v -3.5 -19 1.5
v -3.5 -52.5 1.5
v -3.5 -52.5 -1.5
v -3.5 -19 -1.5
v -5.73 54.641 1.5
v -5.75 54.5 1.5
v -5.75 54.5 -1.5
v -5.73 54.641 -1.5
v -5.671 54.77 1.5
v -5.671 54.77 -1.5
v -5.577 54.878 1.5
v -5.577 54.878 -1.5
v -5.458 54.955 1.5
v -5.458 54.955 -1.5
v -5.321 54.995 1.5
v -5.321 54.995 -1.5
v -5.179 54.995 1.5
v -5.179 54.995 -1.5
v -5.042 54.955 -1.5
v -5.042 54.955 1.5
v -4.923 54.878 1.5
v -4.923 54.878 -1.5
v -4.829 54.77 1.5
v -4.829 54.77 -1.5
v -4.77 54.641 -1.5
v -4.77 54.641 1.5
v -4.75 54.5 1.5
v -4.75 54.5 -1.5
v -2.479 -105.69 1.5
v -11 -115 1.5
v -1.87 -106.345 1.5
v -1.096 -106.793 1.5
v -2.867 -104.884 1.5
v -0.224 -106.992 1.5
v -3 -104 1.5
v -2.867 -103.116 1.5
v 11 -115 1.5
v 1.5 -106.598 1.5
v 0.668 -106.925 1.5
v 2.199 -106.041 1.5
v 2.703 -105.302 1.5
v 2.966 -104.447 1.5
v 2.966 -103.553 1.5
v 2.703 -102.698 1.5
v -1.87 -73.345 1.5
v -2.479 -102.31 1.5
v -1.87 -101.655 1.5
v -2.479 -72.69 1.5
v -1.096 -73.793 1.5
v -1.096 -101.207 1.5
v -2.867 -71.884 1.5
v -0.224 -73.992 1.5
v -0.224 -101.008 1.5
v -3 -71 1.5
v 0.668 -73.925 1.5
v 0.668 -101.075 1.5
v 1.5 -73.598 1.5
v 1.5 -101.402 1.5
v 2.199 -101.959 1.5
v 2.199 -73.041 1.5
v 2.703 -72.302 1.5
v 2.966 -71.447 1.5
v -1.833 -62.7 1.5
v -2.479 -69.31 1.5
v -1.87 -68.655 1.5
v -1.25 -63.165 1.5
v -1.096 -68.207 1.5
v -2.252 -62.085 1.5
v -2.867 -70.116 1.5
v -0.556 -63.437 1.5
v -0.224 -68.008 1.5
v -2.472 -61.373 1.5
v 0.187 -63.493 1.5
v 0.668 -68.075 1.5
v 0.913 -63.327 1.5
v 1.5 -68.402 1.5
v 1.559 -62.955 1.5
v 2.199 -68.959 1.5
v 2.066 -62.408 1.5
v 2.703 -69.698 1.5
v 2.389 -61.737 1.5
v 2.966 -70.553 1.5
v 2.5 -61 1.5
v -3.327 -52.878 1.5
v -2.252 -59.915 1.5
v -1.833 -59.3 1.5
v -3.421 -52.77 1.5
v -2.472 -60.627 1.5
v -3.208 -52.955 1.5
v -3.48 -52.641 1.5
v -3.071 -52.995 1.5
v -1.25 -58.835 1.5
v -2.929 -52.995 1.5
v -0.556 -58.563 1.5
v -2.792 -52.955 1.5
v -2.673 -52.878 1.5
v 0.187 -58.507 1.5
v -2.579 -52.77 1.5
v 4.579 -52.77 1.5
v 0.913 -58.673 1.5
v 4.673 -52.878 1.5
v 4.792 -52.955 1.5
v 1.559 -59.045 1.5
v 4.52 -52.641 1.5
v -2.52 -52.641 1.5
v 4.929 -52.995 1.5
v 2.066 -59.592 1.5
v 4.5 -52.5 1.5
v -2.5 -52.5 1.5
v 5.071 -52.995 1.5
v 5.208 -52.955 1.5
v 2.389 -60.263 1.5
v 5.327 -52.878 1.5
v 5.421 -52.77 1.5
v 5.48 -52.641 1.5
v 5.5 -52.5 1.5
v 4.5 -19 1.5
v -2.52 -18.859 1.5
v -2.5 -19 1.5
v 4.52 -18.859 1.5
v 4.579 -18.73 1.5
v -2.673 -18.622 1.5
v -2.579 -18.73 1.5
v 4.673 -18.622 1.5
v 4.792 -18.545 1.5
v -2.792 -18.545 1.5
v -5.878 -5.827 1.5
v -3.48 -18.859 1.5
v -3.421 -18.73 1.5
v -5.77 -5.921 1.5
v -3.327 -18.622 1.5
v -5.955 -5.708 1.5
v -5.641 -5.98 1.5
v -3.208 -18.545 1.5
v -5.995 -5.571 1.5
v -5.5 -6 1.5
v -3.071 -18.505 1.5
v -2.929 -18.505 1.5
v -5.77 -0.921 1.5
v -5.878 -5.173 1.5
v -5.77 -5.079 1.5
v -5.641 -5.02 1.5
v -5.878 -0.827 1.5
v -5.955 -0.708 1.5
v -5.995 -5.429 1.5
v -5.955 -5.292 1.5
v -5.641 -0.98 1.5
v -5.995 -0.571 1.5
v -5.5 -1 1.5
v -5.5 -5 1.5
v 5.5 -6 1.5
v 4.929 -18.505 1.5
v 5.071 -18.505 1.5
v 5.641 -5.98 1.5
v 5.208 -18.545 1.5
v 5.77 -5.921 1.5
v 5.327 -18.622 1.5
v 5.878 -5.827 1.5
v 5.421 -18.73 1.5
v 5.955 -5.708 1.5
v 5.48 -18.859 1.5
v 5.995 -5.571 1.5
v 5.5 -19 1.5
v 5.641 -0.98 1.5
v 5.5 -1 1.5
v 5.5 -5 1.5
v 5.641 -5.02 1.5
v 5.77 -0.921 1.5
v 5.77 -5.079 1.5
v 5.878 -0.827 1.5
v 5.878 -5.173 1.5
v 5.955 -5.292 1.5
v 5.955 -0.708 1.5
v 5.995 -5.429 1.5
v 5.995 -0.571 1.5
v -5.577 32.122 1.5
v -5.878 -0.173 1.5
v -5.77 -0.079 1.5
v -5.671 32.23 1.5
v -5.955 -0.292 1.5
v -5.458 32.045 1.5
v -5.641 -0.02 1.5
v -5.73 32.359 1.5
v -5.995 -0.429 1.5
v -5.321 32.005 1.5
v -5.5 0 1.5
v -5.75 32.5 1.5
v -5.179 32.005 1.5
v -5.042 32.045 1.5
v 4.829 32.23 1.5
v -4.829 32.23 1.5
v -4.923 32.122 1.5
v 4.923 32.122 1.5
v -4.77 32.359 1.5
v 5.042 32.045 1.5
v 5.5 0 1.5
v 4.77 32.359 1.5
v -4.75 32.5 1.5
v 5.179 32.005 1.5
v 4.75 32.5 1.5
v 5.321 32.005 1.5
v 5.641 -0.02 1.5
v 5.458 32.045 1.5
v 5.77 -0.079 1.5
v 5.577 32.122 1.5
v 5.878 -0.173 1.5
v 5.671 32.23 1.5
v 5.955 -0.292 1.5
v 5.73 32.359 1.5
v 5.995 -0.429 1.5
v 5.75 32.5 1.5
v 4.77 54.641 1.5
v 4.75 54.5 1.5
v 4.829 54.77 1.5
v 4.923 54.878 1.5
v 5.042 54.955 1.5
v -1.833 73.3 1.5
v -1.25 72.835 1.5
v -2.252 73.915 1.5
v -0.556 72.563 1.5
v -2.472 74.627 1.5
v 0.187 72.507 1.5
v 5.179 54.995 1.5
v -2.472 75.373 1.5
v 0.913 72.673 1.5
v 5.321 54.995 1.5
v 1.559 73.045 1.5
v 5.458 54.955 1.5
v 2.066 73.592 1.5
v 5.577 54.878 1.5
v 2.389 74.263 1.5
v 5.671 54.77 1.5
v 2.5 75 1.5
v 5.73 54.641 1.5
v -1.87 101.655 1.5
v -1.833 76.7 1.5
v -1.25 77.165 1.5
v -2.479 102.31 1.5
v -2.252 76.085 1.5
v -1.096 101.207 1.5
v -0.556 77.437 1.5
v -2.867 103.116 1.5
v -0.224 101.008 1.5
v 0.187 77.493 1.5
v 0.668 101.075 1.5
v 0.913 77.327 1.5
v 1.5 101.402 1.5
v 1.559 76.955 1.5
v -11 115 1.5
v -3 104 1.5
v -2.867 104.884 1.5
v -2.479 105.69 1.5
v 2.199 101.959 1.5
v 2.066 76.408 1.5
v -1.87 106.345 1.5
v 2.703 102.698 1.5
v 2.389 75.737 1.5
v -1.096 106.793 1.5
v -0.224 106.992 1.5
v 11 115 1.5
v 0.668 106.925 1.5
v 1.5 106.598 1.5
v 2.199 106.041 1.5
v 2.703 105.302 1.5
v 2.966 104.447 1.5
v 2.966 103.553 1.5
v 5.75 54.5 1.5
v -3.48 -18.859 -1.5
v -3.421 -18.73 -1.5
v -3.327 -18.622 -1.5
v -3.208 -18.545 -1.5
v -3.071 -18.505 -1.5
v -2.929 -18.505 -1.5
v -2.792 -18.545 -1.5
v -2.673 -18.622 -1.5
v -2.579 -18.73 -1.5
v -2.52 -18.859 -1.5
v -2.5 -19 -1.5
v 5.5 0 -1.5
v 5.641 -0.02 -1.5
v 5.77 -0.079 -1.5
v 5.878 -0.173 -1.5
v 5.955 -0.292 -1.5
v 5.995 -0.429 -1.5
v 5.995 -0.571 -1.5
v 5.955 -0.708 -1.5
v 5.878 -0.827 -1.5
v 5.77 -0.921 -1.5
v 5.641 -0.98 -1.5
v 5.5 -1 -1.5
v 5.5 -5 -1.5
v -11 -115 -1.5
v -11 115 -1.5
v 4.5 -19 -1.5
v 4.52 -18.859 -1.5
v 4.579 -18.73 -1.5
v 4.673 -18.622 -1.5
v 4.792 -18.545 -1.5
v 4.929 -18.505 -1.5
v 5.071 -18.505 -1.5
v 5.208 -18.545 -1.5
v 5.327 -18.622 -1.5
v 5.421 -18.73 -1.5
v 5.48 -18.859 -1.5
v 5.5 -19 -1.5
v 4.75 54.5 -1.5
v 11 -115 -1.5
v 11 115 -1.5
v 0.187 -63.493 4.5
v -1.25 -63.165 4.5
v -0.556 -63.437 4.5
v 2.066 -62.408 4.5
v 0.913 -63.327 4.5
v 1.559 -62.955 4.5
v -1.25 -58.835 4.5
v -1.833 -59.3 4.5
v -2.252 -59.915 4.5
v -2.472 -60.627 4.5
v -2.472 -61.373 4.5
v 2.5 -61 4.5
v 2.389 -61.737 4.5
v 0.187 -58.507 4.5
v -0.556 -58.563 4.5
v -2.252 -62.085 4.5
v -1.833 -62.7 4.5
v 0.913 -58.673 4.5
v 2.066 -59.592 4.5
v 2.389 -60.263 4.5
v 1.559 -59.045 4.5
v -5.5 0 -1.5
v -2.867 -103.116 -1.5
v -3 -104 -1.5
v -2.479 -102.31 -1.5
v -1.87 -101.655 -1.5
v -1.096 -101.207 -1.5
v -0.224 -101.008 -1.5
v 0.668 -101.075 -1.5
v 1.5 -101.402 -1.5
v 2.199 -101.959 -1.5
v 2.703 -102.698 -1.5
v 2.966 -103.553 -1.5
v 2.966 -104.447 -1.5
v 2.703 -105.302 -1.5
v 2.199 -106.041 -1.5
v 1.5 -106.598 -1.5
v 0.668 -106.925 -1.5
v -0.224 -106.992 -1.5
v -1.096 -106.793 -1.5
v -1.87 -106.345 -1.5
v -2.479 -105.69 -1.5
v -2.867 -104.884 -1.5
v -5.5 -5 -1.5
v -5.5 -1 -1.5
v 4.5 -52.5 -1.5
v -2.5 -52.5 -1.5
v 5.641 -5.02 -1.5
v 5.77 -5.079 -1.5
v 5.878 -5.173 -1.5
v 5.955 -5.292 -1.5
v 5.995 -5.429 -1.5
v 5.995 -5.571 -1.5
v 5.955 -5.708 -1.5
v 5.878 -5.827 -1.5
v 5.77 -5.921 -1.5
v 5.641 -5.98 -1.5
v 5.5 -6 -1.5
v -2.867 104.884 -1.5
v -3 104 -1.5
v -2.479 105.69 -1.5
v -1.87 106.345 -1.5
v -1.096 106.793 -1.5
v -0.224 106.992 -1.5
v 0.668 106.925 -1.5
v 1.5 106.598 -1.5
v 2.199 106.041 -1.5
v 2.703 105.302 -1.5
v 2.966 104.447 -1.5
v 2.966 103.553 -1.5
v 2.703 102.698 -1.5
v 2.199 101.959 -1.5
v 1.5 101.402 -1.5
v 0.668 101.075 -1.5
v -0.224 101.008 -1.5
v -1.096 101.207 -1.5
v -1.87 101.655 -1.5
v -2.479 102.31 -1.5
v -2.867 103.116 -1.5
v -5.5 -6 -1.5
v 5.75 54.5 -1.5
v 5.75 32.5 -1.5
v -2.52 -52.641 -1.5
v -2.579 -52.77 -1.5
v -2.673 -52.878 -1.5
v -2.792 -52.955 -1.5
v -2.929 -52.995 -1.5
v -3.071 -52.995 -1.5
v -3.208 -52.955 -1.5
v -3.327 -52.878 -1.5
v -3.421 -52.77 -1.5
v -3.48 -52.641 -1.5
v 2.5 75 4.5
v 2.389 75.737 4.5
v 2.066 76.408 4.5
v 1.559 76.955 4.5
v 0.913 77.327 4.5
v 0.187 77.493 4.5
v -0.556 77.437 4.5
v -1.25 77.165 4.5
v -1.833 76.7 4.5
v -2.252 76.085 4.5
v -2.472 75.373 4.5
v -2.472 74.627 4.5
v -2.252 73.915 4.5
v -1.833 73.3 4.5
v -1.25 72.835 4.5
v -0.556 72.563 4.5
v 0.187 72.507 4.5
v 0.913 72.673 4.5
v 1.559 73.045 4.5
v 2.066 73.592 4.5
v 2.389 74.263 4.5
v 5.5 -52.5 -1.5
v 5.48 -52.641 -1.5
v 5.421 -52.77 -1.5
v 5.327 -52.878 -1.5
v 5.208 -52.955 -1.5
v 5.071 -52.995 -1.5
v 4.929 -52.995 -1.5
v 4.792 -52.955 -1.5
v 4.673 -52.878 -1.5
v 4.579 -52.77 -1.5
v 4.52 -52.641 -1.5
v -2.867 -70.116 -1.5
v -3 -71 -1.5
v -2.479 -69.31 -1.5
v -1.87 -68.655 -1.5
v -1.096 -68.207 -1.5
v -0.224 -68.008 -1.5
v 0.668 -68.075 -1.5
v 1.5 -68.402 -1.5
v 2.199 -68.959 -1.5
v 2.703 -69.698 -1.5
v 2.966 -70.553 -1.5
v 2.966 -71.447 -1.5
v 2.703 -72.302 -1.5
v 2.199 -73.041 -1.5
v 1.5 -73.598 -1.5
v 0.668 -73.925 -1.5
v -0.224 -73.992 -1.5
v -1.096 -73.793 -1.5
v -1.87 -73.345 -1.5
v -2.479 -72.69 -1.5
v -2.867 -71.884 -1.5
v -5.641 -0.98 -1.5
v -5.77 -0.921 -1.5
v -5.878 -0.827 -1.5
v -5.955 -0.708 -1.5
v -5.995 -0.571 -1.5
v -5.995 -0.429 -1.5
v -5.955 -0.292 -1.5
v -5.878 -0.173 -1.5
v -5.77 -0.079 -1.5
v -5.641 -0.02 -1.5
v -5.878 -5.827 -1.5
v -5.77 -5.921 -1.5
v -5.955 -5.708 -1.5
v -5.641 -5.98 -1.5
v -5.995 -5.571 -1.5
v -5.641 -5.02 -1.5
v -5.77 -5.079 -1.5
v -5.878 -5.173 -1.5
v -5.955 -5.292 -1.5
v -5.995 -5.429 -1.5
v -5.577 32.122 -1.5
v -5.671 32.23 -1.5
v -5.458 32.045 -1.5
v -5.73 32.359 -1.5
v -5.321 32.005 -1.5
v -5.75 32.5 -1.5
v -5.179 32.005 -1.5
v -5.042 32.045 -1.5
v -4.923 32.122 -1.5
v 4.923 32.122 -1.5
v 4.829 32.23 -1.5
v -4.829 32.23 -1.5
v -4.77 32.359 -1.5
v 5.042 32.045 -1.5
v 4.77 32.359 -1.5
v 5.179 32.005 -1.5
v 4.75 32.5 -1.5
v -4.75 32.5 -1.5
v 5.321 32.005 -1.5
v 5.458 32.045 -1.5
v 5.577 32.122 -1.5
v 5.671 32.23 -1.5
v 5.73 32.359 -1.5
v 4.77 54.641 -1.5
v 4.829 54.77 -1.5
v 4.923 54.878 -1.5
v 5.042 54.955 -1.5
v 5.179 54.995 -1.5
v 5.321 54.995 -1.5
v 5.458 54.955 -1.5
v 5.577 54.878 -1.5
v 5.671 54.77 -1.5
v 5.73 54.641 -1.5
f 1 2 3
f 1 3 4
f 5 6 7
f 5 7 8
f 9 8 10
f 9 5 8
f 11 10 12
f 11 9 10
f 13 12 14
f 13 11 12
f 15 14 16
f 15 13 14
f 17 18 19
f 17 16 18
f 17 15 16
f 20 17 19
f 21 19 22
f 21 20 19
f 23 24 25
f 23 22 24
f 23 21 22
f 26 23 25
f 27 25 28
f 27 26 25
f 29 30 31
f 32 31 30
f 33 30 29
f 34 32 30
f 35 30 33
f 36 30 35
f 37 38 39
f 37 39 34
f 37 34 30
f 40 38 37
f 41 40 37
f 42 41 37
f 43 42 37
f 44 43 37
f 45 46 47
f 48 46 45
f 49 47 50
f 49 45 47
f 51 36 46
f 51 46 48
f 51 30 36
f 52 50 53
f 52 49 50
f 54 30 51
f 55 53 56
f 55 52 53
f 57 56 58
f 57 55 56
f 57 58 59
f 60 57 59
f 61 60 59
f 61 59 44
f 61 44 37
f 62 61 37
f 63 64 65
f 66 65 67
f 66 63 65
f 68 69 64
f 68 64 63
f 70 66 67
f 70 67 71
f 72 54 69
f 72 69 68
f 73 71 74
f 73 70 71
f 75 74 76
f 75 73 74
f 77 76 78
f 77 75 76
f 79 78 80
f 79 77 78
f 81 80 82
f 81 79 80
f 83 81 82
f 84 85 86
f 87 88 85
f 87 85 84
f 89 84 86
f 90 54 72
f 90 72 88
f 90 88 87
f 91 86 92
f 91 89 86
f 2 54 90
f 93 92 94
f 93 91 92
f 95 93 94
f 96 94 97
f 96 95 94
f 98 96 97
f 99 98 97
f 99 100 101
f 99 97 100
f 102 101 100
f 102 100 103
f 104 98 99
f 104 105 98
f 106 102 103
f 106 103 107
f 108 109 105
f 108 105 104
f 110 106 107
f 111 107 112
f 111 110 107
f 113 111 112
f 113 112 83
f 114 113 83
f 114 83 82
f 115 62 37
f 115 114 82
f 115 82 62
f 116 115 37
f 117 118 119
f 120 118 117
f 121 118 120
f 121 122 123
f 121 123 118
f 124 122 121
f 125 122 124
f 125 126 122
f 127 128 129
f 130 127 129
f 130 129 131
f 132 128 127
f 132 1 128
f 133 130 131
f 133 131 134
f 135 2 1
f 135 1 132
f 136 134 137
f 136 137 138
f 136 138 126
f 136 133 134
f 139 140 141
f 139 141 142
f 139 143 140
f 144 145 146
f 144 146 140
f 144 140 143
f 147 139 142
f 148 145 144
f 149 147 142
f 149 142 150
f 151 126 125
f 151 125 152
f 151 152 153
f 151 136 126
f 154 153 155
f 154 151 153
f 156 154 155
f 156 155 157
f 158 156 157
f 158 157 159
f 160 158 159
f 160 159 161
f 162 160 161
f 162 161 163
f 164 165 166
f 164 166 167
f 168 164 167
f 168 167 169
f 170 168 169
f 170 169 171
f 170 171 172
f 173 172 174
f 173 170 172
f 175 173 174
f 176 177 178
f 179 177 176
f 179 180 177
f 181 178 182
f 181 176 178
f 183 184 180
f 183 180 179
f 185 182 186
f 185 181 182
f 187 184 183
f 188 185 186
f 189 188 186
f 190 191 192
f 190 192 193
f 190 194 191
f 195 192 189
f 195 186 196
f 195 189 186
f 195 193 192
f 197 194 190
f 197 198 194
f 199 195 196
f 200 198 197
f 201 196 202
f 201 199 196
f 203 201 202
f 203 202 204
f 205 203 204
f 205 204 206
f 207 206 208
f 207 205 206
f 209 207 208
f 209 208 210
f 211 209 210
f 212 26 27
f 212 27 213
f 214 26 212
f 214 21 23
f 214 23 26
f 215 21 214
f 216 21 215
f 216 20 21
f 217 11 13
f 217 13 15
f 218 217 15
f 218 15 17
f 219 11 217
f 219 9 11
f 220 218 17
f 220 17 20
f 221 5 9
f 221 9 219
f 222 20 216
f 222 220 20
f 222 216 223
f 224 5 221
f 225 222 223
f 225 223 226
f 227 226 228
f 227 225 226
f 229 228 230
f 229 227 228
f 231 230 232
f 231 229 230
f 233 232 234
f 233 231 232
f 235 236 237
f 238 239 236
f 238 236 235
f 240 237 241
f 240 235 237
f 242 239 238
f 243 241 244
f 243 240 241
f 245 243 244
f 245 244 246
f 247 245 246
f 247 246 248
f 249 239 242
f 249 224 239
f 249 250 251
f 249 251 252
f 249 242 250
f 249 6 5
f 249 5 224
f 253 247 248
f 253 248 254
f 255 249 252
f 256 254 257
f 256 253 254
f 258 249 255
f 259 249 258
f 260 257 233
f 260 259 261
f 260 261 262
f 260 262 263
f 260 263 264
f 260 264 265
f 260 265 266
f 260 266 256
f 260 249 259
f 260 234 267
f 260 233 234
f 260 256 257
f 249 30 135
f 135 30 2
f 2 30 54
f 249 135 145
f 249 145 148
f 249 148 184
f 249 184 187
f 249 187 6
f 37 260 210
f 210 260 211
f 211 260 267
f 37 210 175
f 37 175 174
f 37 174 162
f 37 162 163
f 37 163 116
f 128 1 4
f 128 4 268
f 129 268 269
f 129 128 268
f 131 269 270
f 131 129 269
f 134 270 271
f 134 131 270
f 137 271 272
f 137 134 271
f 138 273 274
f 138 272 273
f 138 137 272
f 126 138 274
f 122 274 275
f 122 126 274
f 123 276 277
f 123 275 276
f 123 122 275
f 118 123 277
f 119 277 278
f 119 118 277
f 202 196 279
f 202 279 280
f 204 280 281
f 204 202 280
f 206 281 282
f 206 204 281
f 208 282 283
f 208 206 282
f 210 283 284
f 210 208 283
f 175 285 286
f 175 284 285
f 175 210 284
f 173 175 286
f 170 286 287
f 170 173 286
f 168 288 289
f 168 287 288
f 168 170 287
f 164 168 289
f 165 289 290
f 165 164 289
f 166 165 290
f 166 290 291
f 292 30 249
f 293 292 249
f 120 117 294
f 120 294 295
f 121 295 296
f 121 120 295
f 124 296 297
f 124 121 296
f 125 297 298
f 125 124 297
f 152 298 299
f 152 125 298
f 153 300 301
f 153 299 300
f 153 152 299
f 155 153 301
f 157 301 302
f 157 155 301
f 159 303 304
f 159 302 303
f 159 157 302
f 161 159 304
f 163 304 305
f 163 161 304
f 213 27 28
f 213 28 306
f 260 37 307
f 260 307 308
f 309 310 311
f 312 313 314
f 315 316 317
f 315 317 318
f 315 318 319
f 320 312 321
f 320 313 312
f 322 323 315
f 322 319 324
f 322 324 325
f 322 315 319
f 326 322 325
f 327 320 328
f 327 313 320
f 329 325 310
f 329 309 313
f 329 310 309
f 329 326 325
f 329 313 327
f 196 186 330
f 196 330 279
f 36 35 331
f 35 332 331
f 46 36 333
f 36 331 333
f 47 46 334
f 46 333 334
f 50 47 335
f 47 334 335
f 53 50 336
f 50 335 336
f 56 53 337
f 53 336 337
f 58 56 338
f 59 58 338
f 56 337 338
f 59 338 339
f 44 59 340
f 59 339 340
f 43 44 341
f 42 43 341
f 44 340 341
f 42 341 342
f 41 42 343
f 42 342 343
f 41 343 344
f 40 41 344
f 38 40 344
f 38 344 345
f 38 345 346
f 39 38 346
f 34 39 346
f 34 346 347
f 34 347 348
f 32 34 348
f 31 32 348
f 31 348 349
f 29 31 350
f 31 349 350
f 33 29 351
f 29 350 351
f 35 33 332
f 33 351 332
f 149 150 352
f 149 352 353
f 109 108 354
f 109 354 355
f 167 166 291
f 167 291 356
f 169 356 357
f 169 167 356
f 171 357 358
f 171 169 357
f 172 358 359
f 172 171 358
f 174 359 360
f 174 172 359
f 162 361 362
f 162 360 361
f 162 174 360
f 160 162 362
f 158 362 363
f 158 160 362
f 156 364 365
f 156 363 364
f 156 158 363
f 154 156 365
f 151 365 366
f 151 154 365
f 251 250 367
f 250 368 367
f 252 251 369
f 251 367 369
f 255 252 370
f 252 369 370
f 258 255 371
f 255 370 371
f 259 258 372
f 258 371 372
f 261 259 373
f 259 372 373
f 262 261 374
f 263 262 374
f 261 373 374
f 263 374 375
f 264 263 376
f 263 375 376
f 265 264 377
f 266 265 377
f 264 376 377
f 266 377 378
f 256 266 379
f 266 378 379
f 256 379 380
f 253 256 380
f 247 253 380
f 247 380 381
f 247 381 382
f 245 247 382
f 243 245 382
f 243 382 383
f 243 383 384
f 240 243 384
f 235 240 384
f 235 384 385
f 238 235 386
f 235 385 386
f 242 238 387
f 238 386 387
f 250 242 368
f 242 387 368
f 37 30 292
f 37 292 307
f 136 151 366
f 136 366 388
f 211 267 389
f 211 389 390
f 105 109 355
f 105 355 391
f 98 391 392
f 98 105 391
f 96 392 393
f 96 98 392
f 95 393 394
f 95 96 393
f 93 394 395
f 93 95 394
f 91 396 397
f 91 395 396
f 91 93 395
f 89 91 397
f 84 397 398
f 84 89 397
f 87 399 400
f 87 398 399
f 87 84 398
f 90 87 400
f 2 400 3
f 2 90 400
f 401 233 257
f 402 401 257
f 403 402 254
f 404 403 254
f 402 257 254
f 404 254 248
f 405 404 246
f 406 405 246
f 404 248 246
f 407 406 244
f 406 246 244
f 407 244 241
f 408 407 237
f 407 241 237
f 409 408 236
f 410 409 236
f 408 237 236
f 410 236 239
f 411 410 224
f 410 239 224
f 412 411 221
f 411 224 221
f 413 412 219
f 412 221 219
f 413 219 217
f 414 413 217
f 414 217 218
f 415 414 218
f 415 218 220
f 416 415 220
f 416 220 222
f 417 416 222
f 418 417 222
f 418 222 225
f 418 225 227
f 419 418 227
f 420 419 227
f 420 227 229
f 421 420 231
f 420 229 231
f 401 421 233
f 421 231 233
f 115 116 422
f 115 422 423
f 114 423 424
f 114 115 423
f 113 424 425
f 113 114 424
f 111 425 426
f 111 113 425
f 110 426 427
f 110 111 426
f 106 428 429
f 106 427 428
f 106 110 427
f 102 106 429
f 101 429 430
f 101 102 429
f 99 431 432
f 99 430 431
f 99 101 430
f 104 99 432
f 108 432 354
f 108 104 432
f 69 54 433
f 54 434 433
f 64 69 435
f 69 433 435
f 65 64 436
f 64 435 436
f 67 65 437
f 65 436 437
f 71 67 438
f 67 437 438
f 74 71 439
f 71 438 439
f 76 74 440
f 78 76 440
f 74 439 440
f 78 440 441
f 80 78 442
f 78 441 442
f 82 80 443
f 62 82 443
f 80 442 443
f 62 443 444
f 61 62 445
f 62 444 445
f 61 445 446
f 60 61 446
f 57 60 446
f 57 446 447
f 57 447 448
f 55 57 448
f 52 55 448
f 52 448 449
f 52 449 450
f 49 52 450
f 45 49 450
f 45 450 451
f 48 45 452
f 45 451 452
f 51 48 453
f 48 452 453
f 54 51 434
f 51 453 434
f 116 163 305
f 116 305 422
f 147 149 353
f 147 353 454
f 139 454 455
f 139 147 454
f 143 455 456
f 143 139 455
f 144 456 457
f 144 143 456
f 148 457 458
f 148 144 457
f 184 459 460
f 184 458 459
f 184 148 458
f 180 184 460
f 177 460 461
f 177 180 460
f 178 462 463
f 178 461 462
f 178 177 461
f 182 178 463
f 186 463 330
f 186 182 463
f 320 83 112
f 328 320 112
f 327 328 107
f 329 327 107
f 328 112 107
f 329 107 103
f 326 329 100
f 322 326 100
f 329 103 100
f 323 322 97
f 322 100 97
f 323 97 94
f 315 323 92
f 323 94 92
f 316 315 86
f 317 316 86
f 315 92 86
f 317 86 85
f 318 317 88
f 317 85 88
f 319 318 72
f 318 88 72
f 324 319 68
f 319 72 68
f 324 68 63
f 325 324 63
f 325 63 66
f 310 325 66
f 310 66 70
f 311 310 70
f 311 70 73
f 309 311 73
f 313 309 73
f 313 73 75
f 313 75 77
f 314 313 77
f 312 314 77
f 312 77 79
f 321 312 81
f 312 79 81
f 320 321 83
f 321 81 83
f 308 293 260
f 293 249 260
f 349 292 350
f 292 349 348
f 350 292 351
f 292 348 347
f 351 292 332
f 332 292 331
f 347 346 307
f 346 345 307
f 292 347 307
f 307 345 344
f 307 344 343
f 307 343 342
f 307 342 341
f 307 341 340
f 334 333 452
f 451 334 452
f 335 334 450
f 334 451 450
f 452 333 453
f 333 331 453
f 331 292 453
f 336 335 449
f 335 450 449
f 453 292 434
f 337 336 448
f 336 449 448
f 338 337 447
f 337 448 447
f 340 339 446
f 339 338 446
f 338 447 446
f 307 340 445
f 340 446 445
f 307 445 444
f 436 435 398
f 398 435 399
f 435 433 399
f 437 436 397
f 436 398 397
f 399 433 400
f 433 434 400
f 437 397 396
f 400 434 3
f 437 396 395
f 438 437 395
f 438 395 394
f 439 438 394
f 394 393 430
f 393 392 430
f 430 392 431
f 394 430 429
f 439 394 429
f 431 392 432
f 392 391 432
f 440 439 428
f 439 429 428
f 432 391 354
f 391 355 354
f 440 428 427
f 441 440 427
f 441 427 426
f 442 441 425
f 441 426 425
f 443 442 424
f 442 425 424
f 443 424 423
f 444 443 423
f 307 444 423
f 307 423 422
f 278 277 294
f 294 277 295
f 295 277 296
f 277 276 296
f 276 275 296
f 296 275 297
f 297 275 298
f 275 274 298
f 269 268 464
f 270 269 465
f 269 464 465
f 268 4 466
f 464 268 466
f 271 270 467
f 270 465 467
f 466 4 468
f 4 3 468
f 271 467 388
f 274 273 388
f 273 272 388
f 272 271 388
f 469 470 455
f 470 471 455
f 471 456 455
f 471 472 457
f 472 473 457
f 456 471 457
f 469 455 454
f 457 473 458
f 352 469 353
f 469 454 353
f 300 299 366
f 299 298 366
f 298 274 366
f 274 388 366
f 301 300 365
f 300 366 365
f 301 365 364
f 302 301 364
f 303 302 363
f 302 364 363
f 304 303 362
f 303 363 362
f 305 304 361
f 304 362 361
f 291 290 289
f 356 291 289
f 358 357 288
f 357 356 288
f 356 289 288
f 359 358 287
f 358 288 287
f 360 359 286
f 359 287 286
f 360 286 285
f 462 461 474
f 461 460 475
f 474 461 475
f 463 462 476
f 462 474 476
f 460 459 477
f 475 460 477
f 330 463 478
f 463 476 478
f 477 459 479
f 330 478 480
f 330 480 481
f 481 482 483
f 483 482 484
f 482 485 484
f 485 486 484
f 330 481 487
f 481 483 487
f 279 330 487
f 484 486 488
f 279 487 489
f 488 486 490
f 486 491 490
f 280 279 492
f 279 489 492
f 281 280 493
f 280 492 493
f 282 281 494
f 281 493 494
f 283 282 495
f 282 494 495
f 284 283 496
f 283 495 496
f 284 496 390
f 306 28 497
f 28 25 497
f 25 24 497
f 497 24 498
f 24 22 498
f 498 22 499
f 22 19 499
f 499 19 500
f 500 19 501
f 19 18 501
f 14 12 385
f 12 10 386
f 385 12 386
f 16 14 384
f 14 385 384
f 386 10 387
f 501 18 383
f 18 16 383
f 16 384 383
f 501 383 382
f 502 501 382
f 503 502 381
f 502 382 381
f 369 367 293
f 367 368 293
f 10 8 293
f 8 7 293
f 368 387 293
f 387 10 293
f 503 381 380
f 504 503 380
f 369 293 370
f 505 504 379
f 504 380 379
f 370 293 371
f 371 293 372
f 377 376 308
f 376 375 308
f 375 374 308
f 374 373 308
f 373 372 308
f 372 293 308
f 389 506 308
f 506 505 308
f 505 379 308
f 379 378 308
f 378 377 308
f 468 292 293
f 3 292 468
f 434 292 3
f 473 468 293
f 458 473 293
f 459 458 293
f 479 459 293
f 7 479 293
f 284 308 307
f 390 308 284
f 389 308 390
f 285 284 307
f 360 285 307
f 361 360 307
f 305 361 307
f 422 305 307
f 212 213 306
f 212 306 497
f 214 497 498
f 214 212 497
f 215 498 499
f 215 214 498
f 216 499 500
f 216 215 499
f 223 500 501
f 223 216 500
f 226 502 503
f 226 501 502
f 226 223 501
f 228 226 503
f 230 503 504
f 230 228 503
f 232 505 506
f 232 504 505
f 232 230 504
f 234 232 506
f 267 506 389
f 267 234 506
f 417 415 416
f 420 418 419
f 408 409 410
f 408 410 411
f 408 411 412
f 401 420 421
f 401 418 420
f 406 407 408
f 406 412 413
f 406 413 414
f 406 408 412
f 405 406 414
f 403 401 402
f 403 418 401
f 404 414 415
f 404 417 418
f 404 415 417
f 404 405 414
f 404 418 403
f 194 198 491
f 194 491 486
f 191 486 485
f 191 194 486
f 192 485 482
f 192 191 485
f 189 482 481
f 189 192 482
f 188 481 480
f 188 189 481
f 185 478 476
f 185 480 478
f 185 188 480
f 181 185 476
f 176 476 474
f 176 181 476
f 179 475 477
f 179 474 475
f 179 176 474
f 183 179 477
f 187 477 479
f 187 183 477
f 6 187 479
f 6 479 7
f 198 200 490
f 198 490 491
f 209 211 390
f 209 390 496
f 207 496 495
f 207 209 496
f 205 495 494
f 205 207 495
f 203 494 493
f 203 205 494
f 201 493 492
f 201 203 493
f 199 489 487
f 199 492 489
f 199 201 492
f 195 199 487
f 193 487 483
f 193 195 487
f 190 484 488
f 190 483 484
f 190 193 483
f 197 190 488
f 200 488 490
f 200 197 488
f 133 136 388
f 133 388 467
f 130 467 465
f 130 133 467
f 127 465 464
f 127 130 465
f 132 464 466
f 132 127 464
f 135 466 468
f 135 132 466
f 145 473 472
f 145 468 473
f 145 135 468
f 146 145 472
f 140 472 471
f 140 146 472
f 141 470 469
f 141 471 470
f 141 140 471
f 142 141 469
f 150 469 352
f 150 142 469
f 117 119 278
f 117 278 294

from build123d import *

# Parameters (mm, degrees)
ESQUISSE1_W                       = 22
ESQUISSE1_H                       = 230
EXTRUSION1_DEPTH                  = 1.5
DIAM_TRE_DU_PER_AGE_6_0_6_1_D     = 6
DIAM_TRE_DU_PER_AGE_6_0_6_1_DEPTH = 3
DIAM_TRE_DU_PER_AGE_6_0_6_1_TIP   = 1.802581857
ENL_V_MAT_EXTRU_1_REACH           = 5
ENL_V_MAT_EXTRU_2_REACH           = 5
ENL_V_MAT_EXTRU_3_REACH           = 5
ESQUISSE10_R                      = 2.5
EXTRUSION2_DEPTH                  = 3


with BuildPart() as part:
    # Esquisse1 → Extrusion1 (new body, symmetric)
    with BuildSketch(Plane.XY):
        Rectangle(ESQUISSE1_W, ESQUISSE1_H)
    extrude(amount=EXTRUSION1_DEPTH, both=True)

    # Diamètre du perçage Ø6.0 (6)1
    with Locations(Plane.XY.offset(1.5)):
        with Locations((0, 104), (0, -71), (0, -104)):
            Hole(DIAM_TRE_DU_PER_AGE_6_0_6_1_D / 2, depth=DIAM_TRE_DU_PER_AGE_6_0_6_1_DEPTH)
            with Locations((0, 0, -(DIAM_TRE_DU_PER_AGE_6_0_6_1_DEPTH + DIAM_TRE_DU_PER_AGE_6_0_6_1_TIP / 2))):  # 118° drill point
                Cone(0, DIAM_TRE_DU_PER_AGE_6_0_6_1_D / 2, DIAM_TRE_DU_PER_AGE_6_0_6_1_TIP, mode=Mode.SUBTRACT)

    # Esquisse7 → Enlèv. mat.-Extru.1 (cut, up to next)
    with BuildSketch(Plane.XY.offset(1.5), mode=Mode.PRIVATE) as enl_v_mat_extru_1_sk1:
        with BuildLine():
            Line((-4.75, 54.5), (4.75, 54.5))
            ThreePointArc((4.75, 54.5), (5.25, 55), (5.75, 54.5))
            Line((5.75, 54.5), (5.75, 32.5))
            ThreePointArc((5.75, 32.5), (5.25, 32), (4.75, 32.5))
            Line((4.75, 32.5), (-4.75, 32.5))
            ThreePointArc((-4.75, 32.5), (-5.25, 32), (-5.75, 32.5))
            Line((-5.75, 32.5), (-5.75, 54.5))
            ThreePointArc((-5.75, 54.5), (-5.25, 55), (-4.75, 54.5))
        make_face()
    enl_v_mat_extru_1_tool1 = extrude(enl_v_mat_extru_1_sk1.sketch, amount=-ENL_V_MAT_EXTRU_1_REACH, mode=Mode.PRIVATE) & part.part
    add(enl_v_mat_extru_1_tool1.solids().sort_by_distance((0, 43.5, 1.5))[0], mode=Mode.SUBTRACT)

    # Esquisse8 → Enlèv. mat.-Extru.2 (cut, up to next)
    with BuildSketch(Plane.XY.offset(1.5), mode=Mode.PRIVATE) as enl_v_mat_extru_2_sk1:
        with BuildLine():
            Line((-5.5, 0), (5.5, 0))
            ThreePointArc((5.5, 0), (6, -0.5), (5.5, -1))
            Line((5.5, -1), (5.5, -5))
            ThreePointArc((5.5, -5), (6, -5.5), (5.5, -6))
            Line((5.5, -6), (-5.5, -6))
            ThreePointArc((-5.5, -6), (-6, -5.5), (-5.5, -5))
            Line((-5.5, -5), (-5.5, -1))
            ThreePointArc((-5.5, -1), (-6, -0.5), (-5.5, 0))
        make_face()
    enl_v_mat_extru_2_tool1 = extrude(enl_v_mat_extru_2_sk1.sketch, amount=-ENL_V_MAT_EXTRU_2_REACH, mode=Mode.PRIVATE) & part.part
    add(enl_v_mat_extru_2_tool1.solids().sort_by_distance((0, -3, 1.5))[0], mode=Mode.SUBTRACT)

    # Esquisse9 → Enlèv. mat.-Extru.3 (cut, up to next)
    with BuildSketch(Plane.XY.offset(1.5), mode=Mode.PRIVATE) as enl_v_mat_extru_3_sk1:
        with BuildLine():
            Line((-2.5, -19), (4.5, -19))
            ThreePointArc((4.5, -19), (5, -18.5), (5.5, -19))
            Line((5.5, -19), (5.5, -52.5))
            ThreePointArc((5.5, -52.5), (5, -53), (4.5, -52.5))
            Line((4.5, -52.5), (-2.5, -52.5))
            ThreePointArc((-2.5, -52.5), (-3, -53), (-3.5, -52.5))
            Line((-3.5, -52.5), (-3.5, -19))
            ThreePointArc((-3.5, -19), (-3, -18.5), (-2.5, -19))
        make_face()
    enl_v_mat_extru_3_tool1 = extrude(enl_v_mat_extru_3_sk1.sketch, amount=-ENL_V_MAT_EXTRU_3_REACH, mode=Mode.PRIVATE) & part.part
    add(enl_v_mat_extru_3_tool1.solids().sort_by_distance((1, -35.75, 1.5))[0], mode=Mode.SUBTRACT)

    # Esquisse10 → Extrusion2 (add)
    with BuildSketch(Plane.XY.offset(1.5)):
        with Locations((0, 75)):
            Circle(ESQUISSE10_R)
        with Locations((0, -61)):
            Circle(ESQUISSE10_R)
    extrude(amount=EXTRUSION2_DEPTH)


solid = part.part
